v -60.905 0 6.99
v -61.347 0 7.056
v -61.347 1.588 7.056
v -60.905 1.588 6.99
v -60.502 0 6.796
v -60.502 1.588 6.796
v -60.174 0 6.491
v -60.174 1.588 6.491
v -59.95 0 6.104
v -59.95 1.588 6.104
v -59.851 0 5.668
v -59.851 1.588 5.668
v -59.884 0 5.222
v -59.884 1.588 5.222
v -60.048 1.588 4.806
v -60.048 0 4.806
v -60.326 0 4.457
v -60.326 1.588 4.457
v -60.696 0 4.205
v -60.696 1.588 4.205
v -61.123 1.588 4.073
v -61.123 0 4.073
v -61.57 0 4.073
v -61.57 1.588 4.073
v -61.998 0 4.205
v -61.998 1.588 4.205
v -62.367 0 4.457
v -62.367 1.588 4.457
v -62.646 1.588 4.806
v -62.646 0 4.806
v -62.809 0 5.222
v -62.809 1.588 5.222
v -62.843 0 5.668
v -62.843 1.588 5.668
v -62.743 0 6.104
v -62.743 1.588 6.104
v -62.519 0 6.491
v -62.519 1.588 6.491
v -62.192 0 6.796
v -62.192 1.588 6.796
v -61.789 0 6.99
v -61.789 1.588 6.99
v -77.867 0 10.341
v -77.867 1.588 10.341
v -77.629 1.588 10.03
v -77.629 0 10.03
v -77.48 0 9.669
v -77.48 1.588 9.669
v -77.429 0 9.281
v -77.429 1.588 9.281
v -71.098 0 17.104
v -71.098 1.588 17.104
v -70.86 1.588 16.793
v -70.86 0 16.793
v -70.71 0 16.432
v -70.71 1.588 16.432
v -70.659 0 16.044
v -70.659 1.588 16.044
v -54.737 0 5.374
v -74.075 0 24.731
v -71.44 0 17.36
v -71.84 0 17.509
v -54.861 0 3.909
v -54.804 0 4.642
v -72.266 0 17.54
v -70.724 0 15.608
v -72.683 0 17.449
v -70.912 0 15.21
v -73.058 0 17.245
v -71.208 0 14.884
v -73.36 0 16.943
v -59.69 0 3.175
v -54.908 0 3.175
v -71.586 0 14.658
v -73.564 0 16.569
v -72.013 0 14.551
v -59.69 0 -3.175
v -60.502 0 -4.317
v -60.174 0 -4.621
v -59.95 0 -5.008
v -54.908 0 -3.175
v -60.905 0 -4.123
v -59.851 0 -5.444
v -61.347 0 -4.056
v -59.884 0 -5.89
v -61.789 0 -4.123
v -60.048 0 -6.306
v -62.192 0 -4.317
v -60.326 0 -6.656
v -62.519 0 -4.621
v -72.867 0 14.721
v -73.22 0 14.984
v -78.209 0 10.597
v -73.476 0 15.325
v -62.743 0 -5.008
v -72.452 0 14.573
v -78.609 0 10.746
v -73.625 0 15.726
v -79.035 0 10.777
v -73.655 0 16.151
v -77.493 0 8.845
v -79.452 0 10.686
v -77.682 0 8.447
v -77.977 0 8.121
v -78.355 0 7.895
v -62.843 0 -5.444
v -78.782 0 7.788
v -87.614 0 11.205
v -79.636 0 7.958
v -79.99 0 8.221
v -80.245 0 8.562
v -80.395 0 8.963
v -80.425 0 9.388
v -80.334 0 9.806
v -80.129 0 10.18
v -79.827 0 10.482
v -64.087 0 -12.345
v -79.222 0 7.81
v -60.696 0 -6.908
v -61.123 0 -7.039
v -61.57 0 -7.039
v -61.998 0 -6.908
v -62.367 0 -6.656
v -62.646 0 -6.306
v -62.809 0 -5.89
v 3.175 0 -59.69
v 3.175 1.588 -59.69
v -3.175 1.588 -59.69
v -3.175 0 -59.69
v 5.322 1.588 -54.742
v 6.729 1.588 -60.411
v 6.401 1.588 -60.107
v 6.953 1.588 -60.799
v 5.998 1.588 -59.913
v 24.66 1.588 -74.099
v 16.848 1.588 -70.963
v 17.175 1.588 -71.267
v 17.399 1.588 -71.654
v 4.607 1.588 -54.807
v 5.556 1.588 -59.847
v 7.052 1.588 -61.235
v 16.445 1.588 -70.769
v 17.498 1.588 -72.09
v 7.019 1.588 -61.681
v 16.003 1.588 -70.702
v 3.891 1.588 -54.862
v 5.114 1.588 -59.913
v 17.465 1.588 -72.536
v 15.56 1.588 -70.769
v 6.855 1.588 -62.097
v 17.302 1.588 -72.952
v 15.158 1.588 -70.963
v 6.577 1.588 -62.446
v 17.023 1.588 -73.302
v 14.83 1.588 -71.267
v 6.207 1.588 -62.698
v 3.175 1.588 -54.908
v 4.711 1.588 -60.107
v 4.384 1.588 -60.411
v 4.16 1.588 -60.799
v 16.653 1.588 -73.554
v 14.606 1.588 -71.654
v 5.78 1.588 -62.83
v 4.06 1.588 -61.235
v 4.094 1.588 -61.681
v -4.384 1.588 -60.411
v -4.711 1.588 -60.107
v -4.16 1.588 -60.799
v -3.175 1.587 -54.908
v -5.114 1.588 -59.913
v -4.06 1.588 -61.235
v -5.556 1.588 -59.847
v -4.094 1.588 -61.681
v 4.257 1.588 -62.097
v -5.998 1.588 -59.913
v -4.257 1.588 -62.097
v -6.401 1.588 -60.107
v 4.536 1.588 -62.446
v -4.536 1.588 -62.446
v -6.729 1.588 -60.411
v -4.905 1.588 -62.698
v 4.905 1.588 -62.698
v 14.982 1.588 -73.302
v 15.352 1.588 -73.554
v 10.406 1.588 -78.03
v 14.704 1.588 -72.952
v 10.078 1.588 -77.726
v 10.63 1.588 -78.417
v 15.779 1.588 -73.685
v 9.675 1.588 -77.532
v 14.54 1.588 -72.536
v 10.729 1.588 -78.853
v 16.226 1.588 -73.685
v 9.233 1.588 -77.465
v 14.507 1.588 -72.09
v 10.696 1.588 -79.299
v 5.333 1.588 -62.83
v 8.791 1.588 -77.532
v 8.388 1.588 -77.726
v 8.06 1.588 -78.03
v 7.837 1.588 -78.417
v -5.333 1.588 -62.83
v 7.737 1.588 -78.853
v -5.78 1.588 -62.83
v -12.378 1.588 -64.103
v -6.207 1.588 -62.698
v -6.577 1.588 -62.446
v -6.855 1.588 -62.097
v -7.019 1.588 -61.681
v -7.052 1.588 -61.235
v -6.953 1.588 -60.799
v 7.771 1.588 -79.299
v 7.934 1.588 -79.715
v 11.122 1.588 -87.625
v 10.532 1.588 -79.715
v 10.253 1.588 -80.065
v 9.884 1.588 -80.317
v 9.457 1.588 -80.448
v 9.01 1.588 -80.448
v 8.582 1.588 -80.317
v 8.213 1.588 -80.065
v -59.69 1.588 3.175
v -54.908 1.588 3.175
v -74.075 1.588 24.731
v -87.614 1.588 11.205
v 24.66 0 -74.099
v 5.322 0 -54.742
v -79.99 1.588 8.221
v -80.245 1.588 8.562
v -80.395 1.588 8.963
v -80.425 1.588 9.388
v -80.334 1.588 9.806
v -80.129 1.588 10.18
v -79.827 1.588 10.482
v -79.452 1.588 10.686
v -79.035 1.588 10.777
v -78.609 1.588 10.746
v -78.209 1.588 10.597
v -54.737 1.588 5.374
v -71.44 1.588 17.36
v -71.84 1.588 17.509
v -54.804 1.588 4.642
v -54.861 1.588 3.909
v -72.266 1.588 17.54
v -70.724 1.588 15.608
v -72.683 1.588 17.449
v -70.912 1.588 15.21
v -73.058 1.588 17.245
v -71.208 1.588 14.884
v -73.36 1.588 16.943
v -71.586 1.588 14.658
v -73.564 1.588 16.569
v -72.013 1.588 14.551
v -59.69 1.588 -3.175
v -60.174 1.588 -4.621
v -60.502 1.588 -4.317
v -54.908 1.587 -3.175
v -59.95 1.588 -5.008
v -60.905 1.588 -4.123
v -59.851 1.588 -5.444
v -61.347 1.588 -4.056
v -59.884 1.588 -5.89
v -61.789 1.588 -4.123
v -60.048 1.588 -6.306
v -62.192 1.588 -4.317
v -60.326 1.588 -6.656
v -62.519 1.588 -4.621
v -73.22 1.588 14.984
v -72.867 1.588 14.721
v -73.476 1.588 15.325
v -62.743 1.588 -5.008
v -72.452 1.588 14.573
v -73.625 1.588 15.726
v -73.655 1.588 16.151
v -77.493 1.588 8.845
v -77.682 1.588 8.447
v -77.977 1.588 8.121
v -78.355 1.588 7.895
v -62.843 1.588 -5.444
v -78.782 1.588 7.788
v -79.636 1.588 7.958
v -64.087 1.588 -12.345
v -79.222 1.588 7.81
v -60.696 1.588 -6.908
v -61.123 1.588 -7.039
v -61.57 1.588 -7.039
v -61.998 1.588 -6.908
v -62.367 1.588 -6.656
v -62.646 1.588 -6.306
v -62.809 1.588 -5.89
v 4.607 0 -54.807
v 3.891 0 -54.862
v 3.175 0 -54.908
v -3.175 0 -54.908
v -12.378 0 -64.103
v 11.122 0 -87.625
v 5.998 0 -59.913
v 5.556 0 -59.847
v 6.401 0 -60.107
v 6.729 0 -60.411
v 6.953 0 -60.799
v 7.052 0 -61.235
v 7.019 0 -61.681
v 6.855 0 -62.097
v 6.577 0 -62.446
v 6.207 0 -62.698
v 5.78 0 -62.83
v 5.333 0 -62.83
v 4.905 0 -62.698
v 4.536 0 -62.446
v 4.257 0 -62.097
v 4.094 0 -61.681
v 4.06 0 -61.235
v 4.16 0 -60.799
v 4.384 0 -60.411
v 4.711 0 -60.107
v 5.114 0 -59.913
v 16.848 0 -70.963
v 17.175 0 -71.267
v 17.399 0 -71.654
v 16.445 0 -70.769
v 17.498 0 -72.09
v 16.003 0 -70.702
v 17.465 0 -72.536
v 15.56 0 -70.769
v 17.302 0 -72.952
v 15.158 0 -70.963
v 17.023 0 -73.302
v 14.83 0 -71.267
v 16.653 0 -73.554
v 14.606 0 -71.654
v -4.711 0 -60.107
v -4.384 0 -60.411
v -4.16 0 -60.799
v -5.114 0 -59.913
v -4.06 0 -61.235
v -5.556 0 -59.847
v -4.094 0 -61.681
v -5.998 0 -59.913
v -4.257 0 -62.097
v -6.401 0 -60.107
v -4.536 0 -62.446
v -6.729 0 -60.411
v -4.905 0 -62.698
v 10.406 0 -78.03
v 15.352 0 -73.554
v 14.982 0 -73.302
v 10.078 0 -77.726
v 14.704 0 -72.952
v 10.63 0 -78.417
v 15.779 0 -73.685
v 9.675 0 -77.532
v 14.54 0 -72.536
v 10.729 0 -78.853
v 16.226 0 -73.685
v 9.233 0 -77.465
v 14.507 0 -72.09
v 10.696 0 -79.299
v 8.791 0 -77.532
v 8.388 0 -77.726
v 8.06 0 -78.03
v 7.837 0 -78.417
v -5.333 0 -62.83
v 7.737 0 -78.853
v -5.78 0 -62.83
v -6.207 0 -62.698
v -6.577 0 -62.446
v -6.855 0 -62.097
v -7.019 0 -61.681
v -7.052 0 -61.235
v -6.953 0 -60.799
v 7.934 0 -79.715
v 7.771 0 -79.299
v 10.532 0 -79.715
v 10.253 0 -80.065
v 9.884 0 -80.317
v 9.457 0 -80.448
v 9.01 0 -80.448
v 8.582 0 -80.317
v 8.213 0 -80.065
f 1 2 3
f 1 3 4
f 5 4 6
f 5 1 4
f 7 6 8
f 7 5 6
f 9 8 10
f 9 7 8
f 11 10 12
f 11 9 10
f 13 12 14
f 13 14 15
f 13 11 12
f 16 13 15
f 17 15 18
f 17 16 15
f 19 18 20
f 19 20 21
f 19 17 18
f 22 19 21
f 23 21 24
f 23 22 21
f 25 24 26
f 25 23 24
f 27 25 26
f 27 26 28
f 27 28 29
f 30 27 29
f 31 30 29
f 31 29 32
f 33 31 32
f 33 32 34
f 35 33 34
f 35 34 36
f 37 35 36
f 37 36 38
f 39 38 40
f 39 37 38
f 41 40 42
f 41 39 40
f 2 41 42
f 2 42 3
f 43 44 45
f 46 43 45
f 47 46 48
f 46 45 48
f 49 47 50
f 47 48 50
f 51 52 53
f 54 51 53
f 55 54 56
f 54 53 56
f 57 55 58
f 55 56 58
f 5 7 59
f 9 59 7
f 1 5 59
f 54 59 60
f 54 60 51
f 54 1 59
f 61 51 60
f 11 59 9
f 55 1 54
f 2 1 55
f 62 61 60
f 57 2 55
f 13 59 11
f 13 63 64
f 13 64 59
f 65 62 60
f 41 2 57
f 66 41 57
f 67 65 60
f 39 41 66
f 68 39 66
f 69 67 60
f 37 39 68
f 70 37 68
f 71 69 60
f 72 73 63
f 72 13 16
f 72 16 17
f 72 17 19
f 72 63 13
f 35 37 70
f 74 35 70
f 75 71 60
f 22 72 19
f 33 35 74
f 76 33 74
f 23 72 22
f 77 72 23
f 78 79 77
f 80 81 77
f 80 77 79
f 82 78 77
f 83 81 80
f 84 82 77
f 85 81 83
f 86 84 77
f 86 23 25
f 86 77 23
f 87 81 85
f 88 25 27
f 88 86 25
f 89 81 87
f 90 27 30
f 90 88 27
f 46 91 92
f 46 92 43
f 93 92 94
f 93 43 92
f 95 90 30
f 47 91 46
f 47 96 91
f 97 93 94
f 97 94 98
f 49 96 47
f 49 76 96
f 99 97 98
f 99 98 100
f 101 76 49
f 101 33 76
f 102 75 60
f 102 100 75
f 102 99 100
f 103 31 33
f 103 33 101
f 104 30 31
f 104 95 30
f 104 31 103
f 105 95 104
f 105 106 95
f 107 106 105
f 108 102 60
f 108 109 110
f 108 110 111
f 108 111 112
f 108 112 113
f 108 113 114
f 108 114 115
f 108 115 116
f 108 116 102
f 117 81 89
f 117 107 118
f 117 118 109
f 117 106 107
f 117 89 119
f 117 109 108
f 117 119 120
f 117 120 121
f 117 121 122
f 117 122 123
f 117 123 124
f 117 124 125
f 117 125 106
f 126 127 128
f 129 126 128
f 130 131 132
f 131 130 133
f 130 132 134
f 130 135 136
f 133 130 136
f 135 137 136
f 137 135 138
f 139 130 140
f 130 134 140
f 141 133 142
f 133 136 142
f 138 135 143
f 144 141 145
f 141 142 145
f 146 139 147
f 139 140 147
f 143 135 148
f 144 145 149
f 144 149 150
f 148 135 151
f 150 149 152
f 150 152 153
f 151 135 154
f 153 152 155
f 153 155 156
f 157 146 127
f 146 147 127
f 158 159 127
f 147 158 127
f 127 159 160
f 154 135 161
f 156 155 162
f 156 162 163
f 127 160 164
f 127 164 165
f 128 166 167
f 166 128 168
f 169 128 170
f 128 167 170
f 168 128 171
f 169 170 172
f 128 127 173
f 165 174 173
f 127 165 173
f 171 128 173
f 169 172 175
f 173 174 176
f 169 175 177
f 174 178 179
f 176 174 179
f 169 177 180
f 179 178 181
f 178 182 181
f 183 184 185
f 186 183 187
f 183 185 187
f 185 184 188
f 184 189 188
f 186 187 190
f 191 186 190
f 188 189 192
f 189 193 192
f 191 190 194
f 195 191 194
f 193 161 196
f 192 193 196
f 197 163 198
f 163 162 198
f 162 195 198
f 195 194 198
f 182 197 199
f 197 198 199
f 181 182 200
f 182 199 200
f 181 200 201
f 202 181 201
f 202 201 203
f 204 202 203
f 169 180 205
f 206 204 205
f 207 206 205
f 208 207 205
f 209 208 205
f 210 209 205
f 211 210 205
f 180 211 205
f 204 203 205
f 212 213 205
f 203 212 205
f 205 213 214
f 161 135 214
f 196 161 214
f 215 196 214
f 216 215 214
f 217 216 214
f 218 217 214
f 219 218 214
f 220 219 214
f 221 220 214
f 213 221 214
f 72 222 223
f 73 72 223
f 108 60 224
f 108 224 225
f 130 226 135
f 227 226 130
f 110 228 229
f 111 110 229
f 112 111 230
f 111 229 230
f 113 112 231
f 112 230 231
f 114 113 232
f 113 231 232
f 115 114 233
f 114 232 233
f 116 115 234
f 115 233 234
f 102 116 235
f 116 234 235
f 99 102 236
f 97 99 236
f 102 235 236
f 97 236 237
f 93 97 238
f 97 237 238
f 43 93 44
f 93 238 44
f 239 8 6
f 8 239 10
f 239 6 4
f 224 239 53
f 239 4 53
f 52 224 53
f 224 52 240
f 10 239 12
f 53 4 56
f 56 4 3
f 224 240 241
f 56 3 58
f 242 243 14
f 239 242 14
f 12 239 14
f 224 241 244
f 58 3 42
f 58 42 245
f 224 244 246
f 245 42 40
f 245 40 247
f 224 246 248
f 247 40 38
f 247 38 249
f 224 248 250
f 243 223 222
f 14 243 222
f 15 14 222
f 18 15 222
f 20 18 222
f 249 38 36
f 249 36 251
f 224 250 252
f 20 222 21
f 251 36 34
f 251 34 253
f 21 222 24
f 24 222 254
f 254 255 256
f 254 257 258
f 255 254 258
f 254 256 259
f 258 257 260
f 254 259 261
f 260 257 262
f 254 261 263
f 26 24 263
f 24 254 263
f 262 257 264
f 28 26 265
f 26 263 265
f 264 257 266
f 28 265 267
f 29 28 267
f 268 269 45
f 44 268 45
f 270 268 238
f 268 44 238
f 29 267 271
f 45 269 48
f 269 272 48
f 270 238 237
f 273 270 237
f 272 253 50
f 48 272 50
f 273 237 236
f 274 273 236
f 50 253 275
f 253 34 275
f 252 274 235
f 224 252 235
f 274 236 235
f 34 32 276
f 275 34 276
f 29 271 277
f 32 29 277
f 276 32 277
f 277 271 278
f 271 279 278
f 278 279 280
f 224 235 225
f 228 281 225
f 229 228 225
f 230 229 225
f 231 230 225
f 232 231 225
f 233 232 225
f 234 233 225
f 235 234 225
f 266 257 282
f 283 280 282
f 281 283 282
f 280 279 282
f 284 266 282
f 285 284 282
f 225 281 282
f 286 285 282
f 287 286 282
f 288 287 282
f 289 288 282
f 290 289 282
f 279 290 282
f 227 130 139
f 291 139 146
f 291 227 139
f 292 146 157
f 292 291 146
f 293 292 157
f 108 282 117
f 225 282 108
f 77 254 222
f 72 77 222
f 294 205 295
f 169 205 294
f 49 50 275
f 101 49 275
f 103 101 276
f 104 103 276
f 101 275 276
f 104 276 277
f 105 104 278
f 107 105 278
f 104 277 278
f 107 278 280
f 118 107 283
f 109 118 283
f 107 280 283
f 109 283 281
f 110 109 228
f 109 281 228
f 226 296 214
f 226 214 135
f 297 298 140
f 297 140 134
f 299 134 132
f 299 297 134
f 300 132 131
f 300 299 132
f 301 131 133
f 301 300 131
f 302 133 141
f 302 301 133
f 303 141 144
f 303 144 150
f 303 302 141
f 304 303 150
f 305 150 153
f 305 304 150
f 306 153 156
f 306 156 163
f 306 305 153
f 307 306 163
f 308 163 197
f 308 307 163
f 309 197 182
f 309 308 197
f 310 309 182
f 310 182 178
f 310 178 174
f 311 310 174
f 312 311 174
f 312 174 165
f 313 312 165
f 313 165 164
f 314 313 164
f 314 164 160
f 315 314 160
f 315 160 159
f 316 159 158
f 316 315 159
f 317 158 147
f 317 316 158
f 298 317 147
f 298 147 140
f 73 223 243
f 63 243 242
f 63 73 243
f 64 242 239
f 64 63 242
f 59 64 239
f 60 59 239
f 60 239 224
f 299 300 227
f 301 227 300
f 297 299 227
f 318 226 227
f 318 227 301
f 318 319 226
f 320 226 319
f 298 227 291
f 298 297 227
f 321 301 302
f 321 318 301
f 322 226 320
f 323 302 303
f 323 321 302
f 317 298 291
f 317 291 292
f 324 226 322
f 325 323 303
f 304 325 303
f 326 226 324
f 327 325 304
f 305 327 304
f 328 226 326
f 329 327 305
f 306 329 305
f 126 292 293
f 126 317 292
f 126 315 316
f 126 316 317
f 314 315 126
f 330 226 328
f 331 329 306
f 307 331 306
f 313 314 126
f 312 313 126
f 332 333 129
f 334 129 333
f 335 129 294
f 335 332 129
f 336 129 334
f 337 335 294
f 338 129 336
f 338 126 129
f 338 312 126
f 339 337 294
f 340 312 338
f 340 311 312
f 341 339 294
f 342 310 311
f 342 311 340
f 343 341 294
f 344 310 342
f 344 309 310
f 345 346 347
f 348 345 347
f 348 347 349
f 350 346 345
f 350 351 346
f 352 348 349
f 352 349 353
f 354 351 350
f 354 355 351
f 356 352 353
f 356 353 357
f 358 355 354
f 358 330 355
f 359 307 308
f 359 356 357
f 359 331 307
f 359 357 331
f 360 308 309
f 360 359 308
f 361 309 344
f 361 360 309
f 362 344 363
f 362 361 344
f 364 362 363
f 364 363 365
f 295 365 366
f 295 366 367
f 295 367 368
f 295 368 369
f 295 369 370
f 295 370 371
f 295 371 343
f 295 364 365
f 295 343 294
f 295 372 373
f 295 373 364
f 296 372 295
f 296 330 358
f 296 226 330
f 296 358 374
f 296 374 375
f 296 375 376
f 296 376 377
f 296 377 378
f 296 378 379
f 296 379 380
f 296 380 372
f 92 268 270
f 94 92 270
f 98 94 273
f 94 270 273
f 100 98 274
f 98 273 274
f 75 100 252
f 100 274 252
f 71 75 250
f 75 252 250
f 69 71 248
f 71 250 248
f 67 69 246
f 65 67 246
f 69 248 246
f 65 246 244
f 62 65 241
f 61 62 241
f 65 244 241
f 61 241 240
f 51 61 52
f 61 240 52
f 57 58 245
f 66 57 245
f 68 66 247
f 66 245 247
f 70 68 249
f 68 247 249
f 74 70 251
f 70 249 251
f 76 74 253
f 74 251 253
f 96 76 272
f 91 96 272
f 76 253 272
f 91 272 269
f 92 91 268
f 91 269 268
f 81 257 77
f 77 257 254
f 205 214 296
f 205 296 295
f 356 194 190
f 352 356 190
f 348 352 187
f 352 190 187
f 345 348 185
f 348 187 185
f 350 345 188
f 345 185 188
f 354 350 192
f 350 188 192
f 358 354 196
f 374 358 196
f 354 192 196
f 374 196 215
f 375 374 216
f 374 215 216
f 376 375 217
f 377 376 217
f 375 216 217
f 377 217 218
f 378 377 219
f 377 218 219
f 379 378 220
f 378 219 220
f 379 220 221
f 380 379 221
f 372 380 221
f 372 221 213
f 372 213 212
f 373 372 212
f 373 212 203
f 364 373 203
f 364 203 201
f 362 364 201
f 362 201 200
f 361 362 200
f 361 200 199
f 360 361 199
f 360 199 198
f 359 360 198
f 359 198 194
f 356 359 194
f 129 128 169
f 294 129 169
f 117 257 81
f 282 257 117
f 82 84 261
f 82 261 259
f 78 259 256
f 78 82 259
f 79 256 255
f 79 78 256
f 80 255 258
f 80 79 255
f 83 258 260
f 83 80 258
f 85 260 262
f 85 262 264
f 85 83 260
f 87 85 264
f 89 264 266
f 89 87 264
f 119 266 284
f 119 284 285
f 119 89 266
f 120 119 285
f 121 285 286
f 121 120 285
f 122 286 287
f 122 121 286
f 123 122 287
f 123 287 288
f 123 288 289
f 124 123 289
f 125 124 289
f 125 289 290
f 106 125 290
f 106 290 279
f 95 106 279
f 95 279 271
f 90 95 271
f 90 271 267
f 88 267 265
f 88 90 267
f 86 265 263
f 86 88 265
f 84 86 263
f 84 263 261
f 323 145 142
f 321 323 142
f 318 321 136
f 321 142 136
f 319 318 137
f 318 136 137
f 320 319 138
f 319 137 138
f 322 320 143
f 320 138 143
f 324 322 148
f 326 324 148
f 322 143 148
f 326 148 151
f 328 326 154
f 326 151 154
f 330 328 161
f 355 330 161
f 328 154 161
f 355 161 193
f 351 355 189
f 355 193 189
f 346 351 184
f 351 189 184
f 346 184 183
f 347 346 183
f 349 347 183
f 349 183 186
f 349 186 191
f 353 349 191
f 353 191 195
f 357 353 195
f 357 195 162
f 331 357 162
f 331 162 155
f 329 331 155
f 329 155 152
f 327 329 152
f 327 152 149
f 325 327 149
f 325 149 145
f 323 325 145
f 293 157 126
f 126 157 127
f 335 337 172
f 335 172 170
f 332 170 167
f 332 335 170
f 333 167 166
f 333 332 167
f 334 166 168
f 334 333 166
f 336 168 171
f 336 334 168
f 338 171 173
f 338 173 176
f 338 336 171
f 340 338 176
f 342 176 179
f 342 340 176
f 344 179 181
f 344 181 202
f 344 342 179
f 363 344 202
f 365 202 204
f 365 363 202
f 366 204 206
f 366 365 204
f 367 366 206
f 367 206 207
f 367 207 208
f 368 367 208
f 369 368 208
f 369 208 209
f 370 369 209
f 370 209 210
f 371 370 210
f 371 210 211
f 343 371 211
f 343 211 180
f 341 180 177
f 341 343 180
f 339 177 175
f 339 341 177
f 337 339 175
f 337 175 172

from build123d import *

# Parameters (mm, degrees)
SKETCH1_R           = 1.5
SKETCH1_R_2         = 55
BOSS_EXTRUDE1_DEPTH = 1.5875
CUT_EXTRUDE3_DEPTH  = 140.70900378
CUT_EXTRUDE4_START  = -10
SKETCH3_R           = 1.5
CUT_EXTRUDE4_DEPTH  = 10
CUT_EXTRUDE5_DEPTH  = 140.70900378
CUT_EXTRUDE6_DEPTH  = 140.70900378
SKETCH6_R           = 1.5
CUT_EXTRUDE7_DEPTH  = 124.922732295


with BuildPart() as part:
    # Sketch1 → Boss-Extrude1 (new body)
    with BuildSketch(Plane(origin=(0, 0, 0), x_dir=(1, 0, 0), z_dir=(0, 1, 0))):
        Polygon((0.047005036, -98.782806148), (-98.782806148, -0.047005036), (-0.047005036, 98.782806148), (98.782806148, 0.047005036), align=None)
        with Locations(Location((-61.346730494, 5.55625, 0), (0, 0, 270))):
            Circle(SKETCH1_R, mode=Mode.SUBTRACT)
        with Locations(Location((-61.346730494, -5.55625, 0), (0, 0, 270))):
            Circle(SKETCH1_R, mode=Mode.SUBTRACT)
        with Locations(Location((-5.55625, -61.346730494, 0), (0, 0, 270))):
            Circle(SKETCH1_R, mode=Mode.SUBTRACT)
        with Locations(Location((5.55625, -61.346730494, 0), (0, 0, 270))):
            Circle(SKETCH1_R, mode=Mode.SUBTRACT)
        with Locations(Location((61.346730494, -5.55625, 0), (0, 0, 270))):
            Circle(SKETCH1_R, mode=Mode.SUBTRACT)
        with Locations(Location((61.346730494, 5.55625, 0), (0, 0, 270))):
            Circle(SKETCH1_R, mode=Mode.SUBTRACT)
        with Locations(Location((5.55625, 61.346730494, 0), (0, 0, 270))):
            Circle(SKETCH1_R, mode=Mode.SUBTRACT)
        with Locations(Location((-5.55625, 61.346730494, 0), (0, 0, 270))):
            Circle(SKETCH1_R, mode=Mode.SUBTRACT)
        with Locations(Location((0, 0, 0), (0, 0, 270))):
            Circle(SKETCH1_R_2, mode=Mode.SUBTRACT)
    extrude(amount=BOSS_EXTRUDE1_DEPTH)

    # Sketch2 → Cut-Extrude3 (cut, through all)
    with BuildSketch(Plane(origin=(0, 1.5875, 0), x_dir=(1, 0, 0), z_dir=(0, 1, 0))):
        Polygon((3.175, 53.34), (3.175, 59.69), (-3.175, 59.69), (-3.175, 53.34), (-3.175, 52.244537665), (3.175, 52.244537665), align=None)
        Polygon((53.34, -3.175), (59.69, -3.175), (59.69, 3.175), (53.34, 3.175), (52.244537665, 3.175), (52.244537665, -3.175), align=None)
        Polygon((-3.175, -53.34), (-3.175, -59.69), (3.175, -59.69), (3.175, -53.34), (3.175, -52.244537665), (-3.175, -52.244537665), align=None)
        Polygon((-53.34, 3.175), (-59.69, 3.175), (-59.69, -3.175), (-53.34, -3.175), (-52.244537665, -3.175), (-52.244537665, 3.175), align=None)
    extrude(amount=-CUT_EXTRUDE3_DEPTH, mode=Mode.SUBTRACT)

    # Sketch3 → Cut-Extrude4 (cut)
    # profile 1 of 3: a face of its own
    with BuildSketch(Plane(origin=(0, 1.5875, 0), x_dir=(1, 0, 0), z_dir=(0, 1, 0)).offset(CUT_EXTRUDE4_START)):
        with BuildLine():
            Line((38.872362643, 38.909374482), (49.367900556, 49.414905592))
            Line((49.367900556, 49.414905592), (24.66044776, 74.09885587))
            Line((24.66044776, 74.09885587), (5.321919094, 54.741914263))
            ThreePointArc((5.321919094, 54.741914263), (23.472344653, 49.739813394), (38.872362643, 38.909374482))
        make_face()
    # profile 2 of 3: a face of its own
    with BuildSketch(Plane(origin=(0, 1.5875, 0), x_dir=(1, 0, 0), z_dir=(0, 1, 0)).offset(CUT_EXTRUDE4_START)):
        with BuildLine():
            Line((-49.367900556, -49.414905592), (-38.872362643, -38.909374482))
            ThreePointArc((-38.872362643, -38.909374482), (-49.717452606, -23.519670626), (-54.736824686, -5.374013707))
            Line((-54.736824686, -5.374013707), (-74.075353352, -24.730955314))
            Line((-74.075353352, -24.730955314), (-49.367900556, -49.414905592))
        make_face()
    # profile 3 of 3: a face of its own
    with BuildSketch(Plane(origin=(0, 1.5875, 0), x_dir=(1, 0, 0), z_dir=(0, 1, 0)).offset(CUT_EXTRUDE4_START)):
        with BuildLine():
            Line((98.782806148, 0.047005036), (49.367900556, 49.414905592))
            Line((49.367900556, 49.414905592), (38.872362643, 38.909374482))
            ThreePointArc((38.872362643, 38.909374482), (50.179066182, 22.518022052), (54.908281479, 3.175))
            Line((54.908281479, 3.175), (59.69, 3.175))
            Line((59.69, 3.175), (59.69, -3.175))
            Line((59.69, -3.175), (54.908281479, -3.175))
            ThreePointArc((54.908281479, -3.175), (38.890872965, -38.890872965), (3.175, -54.908281479))
            Line((3.175, -54.908281479), (3.175, -59.69))
            Line((3.175, -59.69), (-3.175, -59.69))
            Line((-3.175, -59.69), (-3.175, -54.908281479))
            ThreePointArc((-3.175, -54.908281479), (-22.494142184, -50.189775527), (-38.872362643, -38.909374482))
            Line((-38.872362643, -38.909374482), (-49.367900556, -49.414905592))
            Line((-49.367900556, -49.414905592), (0.047005036, -98.782806148))
            Line((0.047005036, -98.782806148), (98.782806148, 0.047005036))
        make_face()
        with Locations((-5.55625, -61.346730494)):
            Circle(SKETCH3_R, mode=Mode.SUBTRACT)
        with Locations((5.55625, -61.346730494)):
            Circle(SKETCH3_R, mode=Mode.SUBTRACT)
        with Locations((61.346730494, -5.55625)):
            Circle(SKETCH3_R, mode=Mode.SUBTRACT)
        with Locations((61.346730494, 5.55625)):
            Circle(SKETCH3_R, mode=Mode.SUBTRACT)
    extrude(amount=CUT_EXTRUDE4_DEPTH, mode=Mode.SUBTRACT)

    # Sketch4 → Cut-Extrude5 (cut, through all)
    with BuildSketch(Plane(origin=(0, 1.5875, 0), x_dir=(1, 0, 0), z_dir=(0, 1, 0))):
        Polygon((-54.908281479, 3.175), (-75.255419375, 23.502783048), (-23.546766486, 75.260669691), (-3.175, 54.908281479), align=None)
    extrude(amount=-CUT_EXTRUDE5_DEPTH, mode=Mode.SUBTRACT)


with BuildPart() as cut_extrude5_piece_1:
    # of the separate pieces the step leaves, piece 1, a body of its own (cut_extrude5_pieces)
    add(part.part.solids().sort_by_distance((-74.075353352, 0, 24.730955314))[0])


with BuildPart() as cut_extrude5_piece_2:
    # of the separate pieces the step leaves, piece 2, a body of its own (cut_extrude5_pieces)
    add(part.part.solids().sort_by_distance((-3.175, 0, -54.908281479))[0])


with BuildPart() as cut_extrude6_tool:
    # Sketch5 → Cut-Extrude6 (new, through all)
    with BuildSketch(Plane(origin=(0, 1.5875, 0), x_dir=(1, 0, 0), z_dir=(0, 1, 0))):
        Polygon((-0.047005036, 98.782806148), (11.121699276, 87.624725864), (-87.614101836, -11.205085321), (-98.782806148, -0.047005036), align=None)
    extrude(amount=-CUT_EXTRUDE6_DEPTH)


with BuildPart() as cut_extrude5_piece_1_1:
    add(cut_extrude5_piece_1.part)

    # Cut-Extrude6: cut by cut_extrude6_tool
    add(cut_extrude6_tool.part, mode=Mode.SUBTRACT)


with BuildPart() as cut_extrude5_piece_2_1:
    add(cut_extrude5_piece_2.part)

    # Cut-Extrude6: cut by cut_extrude6_tool
    add(cut_extrude6_tool.part, mode=Mode.SUBTRACT)


with BuildPart() as cut_extrude7_tool:
    # Sketch6 → Cut-Extrude7 (new, through all)
    with BuildSketch(Plane(origin=(0, 1.5875, 0), x_dir=(1, 0, 0), z_dir=(0, 1, 0))):
        with BuildLine():
            ThreePointArc((-73.220428508, -14.983508678), (-73.219419094, -17.104828781), (-71.09809899, -17.103819368))
            Line((-71.09809899, -17.103819368), (-73.220428508, -14.983508678))
        make_face()
        with BuildLine():
            Line((-73.220428508, -14.983508678), (-71.09809899, -17.103819368))
            ThreePointArc((-71.09809899, -17.103819368), (-70.773307917, -16.617359439), (-70.659263749, -16.043664023))
            ThreePointArc((-70.659263749, -16.043664023), (-71.585568332, -14.657708191), (-73.220428508, -14.983508678))
        make_face()
        with BuildLine():
            ThreePointArc((-79.989802749, -8.220573681), (-79.988793336, -10.341893785), (-77.867473232, -10.340884371))
            Line((-77.867473232, -10.340884371), (-79.989802749, -8.220573681))
        make_face()
        with BuildLine():
            Line((-79.989802749, -8.220573681), (-77.867473232, -10.340884371))
            ThreePointArc((-77.867473232, -10.340884371), (-77.542682159, -9.854424443), (-77.428637991, -9.280729026))
            ThreePointArc((-77.428637991, -9.280729026), (-78.354942574, -7.894773194), (-79.989802749, -8.220573681))
        make_face()
        with Locations(Location((16.002609239, 72.202151202, 0), (0, 0, 270))):
            Circle(SKETCH6_R)
        with Locations(Location((9.233234997, 78.965086199, 0), (0, 0, 270))):
            Circle(SKETCH6_R)
    extrude(amount=-CUT_EXTRUDE7_DEPTH)


with BuildPart() as cut_extrude5_piece_1_2:
    add(cut_extrude5_piece_1_1.part)

    # Cut-Extrude7: cut by cut_extrude7_tool
    add(cut_extrude7_tool.part, mode=Mode.SUBTRACT)


with BuildPart() as cut_extrude5_piece_2_2:
    add(cut_extrude5_piece_2_1.part)

    # Cut-Extrude7: cut by cut_extrude7_tool
    add(cut_extrude7_tool.part, mode=Mode.SUBTRACT)


solid = Compound([cut_extrude5_piece_1_2.part, cut_extrude5_piece_2_2.part])
